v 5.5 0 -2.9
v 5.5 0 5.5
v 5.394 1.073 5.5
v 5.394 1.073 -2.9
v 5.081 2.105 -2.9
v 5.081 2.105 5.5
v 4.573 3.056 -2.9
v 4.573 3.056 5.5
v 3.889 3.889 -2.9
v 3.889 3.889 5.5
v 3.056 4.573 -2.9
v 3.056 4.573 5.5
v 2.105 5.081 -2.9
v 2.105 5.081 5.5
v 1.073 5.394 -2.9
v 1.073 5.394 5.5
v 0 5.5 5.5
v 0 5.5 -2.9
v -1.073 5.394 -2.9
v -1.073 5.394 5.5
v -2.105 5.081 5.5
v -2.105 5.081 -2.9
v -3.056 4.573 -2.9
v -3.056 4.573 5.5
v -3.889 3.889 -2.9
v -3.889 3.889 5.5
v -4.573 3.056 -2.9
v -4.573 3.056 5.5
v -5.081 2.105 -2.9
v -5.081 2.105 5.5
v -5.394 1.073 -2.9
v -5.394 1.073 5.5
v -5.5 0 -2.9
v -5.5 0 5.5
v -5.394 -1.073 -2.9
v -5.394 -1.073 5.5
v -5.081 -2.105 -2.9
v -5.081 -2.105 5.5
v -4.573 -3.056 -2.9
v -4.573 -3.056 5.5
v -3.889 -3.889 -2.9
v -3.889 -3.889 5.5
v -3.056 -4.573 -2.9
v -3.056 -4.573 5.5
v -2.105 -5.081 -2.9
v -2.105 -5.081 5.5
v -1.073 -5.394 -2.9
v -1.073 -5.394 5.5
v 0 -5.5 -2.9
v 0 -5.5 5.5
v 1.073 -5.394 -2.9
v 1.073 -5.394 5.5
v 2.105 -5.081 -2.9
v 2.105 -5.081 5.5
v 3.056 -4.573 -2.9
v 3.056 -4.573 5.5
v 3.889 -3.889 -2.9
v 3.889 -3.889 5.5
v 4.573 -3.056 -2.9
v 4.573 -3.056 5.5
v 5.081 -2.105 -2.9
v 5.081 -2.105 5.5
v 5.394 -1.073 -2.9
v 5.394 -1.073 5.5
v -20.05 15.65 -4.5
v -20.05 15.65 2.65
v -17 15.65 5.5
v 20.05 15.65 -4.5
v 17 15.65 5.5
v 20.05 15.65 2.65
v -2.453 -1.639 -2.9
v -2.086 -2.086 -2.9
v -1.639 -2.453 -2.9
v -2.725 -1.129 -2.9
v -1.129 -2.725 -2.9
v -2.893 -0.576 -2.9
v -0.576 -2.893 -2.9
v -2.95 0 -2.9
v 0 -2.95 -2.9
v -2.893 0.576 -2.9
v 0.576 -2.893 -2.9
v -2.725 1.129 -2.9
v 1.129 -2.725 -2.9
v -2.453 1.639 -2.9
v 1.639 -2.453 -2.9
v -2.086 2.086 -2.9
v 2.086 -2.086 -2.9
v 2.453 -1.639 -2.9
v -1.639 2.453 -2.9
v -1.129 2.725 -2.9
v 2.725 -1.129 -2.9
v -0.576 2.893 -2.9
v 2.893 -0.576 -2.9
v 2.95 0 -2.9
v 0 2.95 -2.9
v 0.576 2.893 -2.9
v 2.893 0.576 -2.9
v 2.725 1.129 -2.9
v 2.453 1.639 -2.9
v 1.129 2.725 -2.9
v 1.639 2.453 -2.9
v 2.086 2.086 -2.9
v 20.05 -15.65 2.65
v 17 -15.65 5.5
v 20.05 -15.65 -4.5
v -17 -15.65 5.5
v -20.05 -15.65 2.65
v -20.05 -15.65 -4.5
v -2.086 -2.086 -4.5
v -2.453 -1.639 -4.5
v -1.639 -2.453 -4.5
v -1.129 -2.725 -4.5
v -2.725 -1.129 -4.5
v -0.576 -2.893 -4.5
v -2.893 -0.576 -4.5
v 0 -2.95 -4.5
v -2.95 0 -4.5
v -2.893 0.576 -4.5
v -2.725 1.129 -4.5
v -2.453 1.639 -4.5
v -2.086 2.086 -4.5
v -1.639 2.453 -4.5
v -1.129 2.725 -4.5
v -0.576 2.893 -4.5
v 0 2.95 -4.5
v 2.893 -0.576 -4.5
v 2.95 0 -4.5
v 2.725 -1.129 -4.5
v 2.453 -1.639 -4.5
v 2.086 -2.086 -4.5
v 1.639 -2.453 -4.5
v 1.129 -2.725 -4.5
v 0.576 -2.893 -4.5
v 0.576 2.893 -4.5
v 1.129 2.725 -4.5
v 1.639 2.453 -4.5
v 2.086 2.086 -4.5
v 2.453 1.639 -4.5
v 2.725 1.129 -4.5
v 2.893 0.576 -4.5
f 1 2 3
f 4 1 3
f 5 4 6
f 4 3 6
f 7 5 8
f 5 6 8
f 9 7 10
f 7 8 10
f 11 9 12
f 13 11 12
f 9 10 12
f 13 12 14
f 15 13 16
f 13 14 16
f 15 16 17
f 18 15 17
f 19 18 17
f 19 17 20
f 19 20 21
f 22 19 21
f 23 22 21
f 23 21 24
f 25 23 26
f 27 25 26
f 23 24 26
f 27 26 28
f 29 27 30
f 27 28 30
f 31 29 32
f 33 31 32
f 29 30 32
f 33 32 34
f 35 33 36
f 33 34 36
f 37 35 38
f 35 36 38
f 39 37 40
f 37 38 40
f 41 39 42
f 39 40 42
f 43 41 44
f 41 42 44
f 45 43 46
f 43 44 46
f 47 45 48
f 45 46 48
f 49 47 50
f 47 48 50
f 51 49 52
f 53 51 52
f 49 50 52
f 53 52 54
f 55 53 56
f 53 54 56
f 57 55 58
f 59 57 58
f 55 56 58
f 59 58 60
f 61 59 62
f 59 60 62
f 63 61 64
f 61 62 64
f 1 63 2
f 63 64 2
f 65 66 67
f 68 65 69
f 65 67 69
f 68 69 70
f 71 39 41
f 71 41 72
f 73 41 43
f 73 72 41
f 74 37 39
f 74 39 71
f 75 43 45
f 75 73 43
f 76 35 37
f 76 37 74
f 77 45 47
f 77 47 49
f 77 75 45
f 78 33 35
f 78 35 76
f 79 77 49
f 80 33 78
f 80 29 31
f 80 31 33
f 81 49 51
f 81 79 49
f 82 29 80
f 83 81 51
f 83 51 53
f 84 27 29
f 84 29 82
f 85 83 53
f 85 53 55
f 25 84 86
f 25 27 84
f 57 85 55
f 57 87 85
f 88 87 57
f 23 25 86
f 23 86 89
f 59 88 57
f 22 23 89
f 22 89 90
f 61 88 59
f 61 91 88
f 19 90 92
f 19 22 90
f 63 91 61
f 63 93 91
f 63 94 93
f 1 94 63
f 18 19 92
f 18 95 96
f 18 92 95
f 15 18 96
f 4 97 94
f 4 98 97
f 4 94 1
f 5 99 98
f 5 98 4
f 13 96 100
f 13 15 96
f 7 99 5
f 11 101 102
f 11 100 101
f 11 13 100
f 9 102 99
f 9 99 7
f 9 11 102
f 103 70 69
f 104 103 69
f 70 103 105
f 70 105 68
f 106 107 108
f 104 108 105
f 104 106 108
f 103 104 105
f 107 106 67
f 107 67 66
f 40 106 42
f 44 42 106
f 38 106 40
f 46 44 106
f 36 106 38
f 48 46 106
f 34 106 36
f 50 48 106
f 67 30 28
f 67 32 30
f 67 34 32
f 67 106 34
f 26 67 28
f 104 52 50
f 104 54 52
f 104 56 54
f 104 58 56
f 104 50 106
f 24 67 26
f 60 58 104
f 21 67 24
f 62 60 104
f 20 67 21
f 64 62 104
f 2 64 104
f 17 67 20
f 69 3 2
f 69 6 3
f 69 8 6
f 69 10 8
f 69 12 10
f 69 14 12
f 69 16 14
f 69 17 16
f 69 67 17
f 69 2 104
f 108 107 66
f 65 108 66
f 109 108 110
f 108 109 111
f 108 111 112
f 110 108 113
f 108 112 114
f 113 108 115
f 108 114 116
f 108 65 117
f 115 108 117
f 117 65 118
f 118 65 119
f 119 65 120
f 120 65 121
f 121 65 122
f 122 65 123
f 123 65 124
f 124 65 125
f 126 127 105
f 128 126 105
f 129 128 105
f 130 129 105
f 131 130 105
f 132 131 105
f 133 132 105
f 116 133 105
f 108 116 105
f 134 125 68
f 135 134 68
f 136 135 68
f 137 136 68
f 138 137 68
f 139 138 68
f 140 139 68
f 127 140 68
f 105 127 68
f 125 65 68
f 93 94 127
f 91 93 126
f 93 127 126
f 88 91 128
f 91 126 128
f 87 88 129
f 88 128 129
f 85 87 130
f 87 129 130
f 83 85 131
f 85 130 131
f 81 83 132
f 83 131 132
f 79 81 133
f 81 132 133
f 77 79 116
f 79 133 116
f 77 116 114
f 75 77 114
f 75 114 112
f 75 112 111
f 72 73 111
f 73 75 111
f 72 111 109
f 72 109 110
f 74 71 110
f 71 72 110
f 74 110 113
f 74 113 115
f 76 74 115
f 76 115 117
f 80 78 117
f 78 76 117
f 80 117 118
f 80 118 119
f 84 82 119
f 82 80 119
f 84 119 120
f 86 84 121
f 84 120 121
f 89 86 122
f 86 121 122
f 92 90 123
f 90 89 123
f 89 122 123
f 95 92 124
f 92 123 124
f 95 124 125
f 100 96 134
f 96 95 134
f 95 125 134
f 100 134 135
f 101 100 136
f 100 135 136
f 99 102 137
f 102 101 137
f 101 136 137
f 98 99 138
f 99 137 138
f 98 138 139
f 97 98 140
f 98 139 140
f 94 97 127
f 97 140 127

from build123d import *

# Parameters (mm, degrees)
F0_W      = 40.1
F0_H      = 31.3
F1_DEPTH  = 2.65
F2_W      = 34
F2_H      = 31.3
F3_DEPTH  = 2.85
F5_DEPTH  = 31.3
F6_DEPTH  = 4.5
F7_R      = 2.95
F8_DEPTH  = 25
F9_R      = 5.5
F9_R_2    = 2.95
F10_DEPTH = 8.4


with BuildPart() as f1:
    # F0 (on Top) → F1 (new body)
    with BuildSketch(Plane.XY):
        Rectangle(F0_W, F0_H)
    extrude(amount=F1_DEPTH)

    # F2 (on face) → F3 (join)
    with BuildSketch(Plane.XY.offset(2.65)):
        Rectangle(F2_W, F2_H)
    extrude(amount=F3_DEPTH)

    # F4 (on face) → F5 (join)
    with BuildSketch(Plane.XZ.offset(15.65)):
        Polygon((20.05, 2.65), (17, 5.5), (17, 2.65), align=None)
        Polygon((-17, 5.5), (-20.05, 2.65), (-17, 2.65), align=None)
    extrude(amount=-F5_DEPTH)

    # F6 (add): a face of the model
    f6_faces = [f1.faces().sort_by_distance(p)[0] for p in [
        (0, 0, 0),
    ]]
    extrude(f6_faces, amount=F6_DEPTH)

    # F7 (on face) → F8 (cut)
    with BuildSketch(Plane(origin=(0, 0, -4.5), x_dir=(1, 0, 0), z_dir=(0, 0, -1))):
        Circle(F7_R)
    extrude(amount=-F8_DEPTH, mode=Mode.SUBTRACT)

    # F9 (on face) → F10 (cut)
    with BuildSketch(Plane.XY.offset(5.5)):
        Circle(F9_R)
        Circle(F9_R_2, mode=Mode.SUBTRACT)
    extrude(amount=-F10_DEPTH, mode=Mode.SUBTRACT)


solid = f1.part
